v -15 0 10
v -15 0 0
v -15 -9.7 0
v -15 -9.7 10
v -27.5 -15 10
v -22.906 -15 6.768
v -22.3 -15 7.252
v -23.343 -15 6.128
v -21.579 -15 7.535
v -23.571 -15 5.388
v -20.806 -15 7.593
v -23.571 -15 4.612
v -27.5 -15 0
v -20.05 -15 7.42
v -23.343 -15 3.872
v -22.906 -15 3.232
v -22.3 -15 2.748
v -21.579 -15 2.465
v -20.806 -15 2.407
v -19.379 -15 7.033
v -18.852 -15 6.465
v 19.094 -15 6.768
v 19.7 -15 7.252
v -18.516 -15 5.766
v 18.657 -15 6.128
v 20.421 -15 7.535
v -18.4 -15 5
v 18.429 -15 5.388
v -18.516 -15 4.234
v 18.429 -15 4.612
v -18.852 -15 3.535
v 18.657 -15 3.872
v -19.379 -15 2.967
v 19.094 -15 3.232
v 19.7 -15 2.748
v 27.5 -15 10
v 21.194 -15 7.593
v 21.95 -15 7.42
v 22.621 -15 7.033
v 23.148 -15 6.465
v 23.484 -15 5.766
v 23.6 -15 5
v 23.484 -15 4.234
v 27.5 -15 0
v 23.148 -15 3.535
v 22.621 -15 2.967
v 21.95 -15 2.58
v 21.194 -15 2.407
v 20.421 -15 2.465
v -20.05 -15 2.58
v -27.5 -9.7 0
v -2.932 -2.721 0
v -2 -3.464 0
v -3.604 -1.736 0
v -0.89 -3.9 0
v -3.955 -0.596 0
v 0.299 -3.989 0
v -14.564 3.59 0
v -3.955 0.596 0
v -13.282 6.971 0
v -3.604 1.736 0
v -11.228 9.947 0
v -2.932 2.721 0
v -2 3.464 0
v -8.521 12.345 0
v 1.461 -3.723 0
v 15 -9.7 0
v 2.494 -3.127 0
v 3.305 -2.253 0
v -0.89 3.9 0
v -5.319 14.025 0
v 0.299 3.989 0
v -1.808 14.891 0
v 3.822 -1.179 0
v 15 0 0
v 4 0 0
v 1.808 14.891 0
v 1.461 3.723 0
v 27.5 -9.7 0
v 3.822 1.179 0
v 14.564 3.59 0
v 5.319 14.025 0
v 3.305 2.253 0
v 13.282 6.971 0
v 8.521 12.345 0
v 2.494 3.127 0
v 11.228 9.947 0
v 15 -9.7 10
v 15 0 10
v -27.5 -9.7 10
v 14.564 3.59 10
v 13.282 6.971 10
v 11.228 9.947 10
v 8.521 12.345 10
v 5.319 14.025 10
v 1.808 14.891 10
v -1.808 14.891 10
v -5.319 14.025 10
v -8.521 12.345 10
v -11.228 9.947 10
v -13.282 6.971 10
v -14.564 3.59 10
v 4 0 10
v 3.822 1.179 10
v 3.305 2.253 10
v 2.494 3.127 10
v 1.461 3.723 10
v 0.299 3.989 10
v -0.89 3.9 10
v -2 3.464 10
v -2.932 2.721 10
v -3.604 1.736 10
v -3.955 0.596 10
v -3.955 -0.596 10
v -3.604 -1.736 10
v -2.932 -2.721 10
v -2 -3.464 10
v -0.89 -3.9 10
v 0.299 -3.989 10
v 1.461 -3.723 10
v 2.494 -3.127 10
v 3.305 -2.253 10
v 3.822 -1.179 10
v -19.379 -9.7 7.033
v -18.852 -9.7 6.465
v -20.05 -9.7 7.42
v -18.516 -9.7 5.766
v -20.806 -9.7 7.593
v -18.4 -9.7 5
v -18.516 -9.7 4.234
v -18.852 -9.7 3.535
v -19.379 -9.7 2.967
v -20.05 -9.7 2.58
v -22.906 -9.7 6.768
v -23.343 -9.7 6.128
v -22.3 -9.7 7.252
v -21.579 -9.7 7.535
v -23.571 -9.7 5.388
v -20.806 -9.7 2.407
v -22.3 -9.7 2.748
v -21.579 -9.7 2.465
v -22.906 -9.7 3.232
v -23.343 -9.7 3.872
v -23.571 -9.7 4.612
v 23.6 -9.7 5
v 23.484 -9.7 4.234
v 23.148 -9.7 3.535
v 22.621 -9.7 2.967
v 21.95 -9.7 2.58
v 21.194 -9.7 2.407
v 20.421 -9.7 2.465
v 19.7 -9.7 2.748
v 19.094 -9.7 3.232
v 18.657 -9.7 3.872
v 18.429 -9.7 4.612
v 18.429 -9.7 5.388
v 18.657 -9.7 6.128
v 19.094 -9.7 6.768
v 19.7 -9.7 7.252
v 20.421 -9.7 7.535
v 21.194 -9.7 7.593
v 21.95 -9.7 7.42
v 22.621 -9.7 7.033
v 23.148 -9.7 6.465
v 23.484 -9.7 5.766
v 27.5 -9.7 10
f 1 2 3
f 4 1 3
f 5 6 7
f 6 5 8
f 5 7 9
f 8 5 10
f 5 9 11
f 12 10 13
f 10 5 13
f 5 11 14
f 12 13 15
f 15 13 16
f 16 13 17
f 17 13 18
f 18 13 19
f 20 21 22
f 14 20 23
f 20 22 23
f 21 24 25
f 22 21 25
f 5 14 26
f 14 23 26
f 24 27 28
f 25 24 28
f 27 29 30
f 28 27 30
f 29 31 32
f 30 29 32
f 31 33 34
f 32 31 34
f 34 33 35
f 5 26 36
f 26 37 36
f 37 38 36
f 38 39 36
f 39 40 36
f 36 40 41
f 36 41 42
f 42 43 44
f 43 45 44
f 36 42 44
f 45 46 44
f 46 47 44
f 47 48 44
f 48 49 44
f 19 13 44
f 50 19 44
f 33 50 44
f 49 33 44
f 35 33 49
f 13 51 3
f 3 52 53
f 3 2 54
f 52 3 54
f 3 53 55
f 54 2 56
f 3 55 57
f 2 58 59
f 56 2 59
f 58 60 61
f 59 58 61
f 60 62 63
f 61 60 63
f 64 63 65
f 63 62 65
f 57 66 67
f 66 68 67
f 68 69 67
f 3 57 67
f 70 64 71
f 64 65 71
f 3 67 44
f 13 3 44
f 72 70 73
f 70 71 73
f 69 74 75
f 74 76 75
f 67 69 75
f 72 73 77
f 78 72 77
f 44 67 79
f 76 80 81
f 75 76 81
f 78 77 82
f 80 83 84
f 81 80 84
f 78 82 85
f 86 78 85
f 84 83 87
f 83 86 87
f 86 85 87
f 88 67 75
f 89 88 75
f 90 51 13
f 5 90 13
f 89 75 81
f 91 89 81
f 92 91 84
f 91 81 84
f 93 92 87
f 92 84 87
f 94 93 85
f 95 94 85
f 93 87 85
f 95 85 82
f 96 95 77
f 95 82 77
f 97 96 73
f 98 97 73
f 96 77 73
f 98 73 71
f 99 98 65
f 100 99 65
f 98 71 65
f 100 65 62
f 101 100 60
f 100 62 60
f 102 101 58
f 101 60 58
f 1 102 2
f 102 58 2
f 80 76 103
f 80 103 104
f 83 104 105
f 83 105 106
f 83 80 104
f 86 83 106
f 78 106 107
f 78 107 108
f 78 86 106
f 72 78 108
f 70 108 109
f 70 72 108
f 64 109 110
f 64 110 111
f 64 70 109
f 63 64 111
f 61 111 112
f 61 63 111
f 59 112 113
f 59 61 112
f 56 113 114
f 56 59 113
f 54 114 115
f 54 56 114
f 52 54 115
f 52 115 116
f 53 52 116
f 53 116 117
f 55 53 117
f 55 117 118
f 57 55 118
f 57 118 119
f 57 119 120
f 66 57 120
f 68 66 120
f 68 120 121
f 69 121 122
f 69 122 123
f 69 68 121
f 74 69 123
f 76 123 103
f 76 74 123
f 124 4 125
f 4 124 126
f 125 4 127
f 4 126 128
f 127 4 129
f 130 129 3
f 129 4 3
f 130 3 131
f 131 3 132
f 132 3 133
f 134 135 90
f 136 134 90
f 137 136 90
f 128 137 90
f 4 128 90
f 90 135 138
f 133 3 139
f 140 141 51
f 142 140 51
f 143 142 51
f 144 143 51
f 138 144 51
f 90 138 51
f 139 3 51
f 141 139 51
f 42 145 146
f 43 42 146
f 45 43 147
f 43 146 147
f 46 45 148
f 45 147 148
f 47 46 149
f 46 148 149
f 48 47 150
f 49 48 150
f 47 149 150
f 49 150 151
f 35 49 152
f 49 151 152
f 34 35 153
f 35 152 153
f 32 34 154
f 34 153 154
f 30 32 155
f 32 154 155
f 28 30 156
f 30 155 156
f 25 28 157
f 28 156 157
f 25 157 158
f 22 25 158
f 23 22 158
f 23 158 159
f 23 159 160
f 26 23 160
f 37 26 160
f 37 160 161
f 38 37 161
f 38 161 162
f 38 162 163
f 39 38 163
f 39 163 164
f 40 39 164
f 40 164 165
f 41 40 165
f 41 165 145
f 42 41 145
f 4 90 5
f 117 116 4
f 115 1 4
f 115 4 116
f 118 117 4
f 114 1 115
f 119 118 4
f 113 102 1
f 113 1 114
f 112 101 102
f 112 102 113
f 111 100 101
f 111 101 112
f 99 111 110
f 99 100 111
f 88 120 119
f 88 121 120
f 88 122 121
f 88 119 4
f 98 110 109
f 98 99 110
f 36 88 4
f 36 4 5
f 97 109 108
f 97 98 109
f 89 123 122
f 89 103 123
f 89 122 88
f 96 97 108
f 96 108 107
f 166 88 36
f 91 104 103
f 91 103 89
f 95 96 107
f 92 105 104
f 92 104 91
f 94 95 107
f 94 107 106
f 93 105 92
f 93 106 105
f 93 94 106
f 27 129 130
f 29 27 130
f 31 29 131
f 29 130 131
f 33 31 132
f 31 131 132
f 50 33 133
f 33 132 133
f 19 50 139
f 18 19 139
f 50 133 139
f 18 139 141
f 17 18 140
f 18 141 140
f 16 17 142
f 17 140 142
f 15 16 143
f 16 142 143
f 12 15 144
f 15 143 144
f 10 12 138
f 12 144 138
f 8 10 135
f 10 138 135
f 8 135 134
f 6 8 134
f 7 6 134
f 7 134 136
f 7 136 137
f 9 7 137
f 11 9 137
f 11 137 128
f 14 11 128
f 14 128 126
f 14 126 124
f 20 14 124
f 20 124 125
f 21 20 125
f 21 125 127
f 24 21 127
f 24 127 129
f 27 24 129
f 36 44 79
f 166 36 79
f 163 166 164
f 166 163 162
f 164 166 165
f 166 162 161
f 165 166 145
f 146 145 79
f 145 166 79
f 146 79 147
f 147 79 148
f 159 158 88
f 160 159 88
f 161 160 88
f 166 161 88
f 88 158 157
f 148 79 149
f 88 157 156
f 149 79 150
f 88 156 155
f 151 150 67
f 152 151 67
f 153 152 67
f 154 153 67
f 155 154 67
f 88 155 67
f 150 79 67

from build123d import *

# Parameters (mm, degrees)
SKETCH_1_R          = 4
EXTRUDE_1_DEPTH     = 10
SKETCH_2_R          = 2.6
CUT_EXTRUDE_1_DEPTH = 10


with BuildPart() as part:
    # 草图1 → 凸台-拉伸1 (new body)
    with BuildSketch(Plane.XY):
        with BuildLine():
            Line((-27.5, -15), (27.5, -15))
            Line((27.5, -15), (27.5, -9.7))
            Line((27.5, -9.7), (15, -9.7))
            Line((15, -9.7), (15, 0))
            ThreePointArc((15, 0), (0, 15), (-15, 0))
            Line((-15, 0), (-15, -9.7))
            Line((-15, -9.7), (-27.5, -9.7))
            Line((-27.5, -9.7), (-27.5, -15))
        make_face()
        Circle(SKETCH_1_R, mode=Mode.SUBTRACT)
    extrude(amount=EXTRUDE_1_DEPTH)

    # 草图2 → 切除-拉伸1 (cut)
    with BuildSketch(Plane(origin=(0, -9.7, 0), x_dir=(1, 0, 0), z_dir=(0, 1, 0))):
        with Locations((21, -5)):
            Circle(SKETCH_2_R)
        with Locations((-21, -5)):
            Circle(SKETCH_2_R)
    extrude(amount=-CUT_EXTRUDE_1_DEPTH, mode=Mode.SUBTRACT)


solid = part.part
